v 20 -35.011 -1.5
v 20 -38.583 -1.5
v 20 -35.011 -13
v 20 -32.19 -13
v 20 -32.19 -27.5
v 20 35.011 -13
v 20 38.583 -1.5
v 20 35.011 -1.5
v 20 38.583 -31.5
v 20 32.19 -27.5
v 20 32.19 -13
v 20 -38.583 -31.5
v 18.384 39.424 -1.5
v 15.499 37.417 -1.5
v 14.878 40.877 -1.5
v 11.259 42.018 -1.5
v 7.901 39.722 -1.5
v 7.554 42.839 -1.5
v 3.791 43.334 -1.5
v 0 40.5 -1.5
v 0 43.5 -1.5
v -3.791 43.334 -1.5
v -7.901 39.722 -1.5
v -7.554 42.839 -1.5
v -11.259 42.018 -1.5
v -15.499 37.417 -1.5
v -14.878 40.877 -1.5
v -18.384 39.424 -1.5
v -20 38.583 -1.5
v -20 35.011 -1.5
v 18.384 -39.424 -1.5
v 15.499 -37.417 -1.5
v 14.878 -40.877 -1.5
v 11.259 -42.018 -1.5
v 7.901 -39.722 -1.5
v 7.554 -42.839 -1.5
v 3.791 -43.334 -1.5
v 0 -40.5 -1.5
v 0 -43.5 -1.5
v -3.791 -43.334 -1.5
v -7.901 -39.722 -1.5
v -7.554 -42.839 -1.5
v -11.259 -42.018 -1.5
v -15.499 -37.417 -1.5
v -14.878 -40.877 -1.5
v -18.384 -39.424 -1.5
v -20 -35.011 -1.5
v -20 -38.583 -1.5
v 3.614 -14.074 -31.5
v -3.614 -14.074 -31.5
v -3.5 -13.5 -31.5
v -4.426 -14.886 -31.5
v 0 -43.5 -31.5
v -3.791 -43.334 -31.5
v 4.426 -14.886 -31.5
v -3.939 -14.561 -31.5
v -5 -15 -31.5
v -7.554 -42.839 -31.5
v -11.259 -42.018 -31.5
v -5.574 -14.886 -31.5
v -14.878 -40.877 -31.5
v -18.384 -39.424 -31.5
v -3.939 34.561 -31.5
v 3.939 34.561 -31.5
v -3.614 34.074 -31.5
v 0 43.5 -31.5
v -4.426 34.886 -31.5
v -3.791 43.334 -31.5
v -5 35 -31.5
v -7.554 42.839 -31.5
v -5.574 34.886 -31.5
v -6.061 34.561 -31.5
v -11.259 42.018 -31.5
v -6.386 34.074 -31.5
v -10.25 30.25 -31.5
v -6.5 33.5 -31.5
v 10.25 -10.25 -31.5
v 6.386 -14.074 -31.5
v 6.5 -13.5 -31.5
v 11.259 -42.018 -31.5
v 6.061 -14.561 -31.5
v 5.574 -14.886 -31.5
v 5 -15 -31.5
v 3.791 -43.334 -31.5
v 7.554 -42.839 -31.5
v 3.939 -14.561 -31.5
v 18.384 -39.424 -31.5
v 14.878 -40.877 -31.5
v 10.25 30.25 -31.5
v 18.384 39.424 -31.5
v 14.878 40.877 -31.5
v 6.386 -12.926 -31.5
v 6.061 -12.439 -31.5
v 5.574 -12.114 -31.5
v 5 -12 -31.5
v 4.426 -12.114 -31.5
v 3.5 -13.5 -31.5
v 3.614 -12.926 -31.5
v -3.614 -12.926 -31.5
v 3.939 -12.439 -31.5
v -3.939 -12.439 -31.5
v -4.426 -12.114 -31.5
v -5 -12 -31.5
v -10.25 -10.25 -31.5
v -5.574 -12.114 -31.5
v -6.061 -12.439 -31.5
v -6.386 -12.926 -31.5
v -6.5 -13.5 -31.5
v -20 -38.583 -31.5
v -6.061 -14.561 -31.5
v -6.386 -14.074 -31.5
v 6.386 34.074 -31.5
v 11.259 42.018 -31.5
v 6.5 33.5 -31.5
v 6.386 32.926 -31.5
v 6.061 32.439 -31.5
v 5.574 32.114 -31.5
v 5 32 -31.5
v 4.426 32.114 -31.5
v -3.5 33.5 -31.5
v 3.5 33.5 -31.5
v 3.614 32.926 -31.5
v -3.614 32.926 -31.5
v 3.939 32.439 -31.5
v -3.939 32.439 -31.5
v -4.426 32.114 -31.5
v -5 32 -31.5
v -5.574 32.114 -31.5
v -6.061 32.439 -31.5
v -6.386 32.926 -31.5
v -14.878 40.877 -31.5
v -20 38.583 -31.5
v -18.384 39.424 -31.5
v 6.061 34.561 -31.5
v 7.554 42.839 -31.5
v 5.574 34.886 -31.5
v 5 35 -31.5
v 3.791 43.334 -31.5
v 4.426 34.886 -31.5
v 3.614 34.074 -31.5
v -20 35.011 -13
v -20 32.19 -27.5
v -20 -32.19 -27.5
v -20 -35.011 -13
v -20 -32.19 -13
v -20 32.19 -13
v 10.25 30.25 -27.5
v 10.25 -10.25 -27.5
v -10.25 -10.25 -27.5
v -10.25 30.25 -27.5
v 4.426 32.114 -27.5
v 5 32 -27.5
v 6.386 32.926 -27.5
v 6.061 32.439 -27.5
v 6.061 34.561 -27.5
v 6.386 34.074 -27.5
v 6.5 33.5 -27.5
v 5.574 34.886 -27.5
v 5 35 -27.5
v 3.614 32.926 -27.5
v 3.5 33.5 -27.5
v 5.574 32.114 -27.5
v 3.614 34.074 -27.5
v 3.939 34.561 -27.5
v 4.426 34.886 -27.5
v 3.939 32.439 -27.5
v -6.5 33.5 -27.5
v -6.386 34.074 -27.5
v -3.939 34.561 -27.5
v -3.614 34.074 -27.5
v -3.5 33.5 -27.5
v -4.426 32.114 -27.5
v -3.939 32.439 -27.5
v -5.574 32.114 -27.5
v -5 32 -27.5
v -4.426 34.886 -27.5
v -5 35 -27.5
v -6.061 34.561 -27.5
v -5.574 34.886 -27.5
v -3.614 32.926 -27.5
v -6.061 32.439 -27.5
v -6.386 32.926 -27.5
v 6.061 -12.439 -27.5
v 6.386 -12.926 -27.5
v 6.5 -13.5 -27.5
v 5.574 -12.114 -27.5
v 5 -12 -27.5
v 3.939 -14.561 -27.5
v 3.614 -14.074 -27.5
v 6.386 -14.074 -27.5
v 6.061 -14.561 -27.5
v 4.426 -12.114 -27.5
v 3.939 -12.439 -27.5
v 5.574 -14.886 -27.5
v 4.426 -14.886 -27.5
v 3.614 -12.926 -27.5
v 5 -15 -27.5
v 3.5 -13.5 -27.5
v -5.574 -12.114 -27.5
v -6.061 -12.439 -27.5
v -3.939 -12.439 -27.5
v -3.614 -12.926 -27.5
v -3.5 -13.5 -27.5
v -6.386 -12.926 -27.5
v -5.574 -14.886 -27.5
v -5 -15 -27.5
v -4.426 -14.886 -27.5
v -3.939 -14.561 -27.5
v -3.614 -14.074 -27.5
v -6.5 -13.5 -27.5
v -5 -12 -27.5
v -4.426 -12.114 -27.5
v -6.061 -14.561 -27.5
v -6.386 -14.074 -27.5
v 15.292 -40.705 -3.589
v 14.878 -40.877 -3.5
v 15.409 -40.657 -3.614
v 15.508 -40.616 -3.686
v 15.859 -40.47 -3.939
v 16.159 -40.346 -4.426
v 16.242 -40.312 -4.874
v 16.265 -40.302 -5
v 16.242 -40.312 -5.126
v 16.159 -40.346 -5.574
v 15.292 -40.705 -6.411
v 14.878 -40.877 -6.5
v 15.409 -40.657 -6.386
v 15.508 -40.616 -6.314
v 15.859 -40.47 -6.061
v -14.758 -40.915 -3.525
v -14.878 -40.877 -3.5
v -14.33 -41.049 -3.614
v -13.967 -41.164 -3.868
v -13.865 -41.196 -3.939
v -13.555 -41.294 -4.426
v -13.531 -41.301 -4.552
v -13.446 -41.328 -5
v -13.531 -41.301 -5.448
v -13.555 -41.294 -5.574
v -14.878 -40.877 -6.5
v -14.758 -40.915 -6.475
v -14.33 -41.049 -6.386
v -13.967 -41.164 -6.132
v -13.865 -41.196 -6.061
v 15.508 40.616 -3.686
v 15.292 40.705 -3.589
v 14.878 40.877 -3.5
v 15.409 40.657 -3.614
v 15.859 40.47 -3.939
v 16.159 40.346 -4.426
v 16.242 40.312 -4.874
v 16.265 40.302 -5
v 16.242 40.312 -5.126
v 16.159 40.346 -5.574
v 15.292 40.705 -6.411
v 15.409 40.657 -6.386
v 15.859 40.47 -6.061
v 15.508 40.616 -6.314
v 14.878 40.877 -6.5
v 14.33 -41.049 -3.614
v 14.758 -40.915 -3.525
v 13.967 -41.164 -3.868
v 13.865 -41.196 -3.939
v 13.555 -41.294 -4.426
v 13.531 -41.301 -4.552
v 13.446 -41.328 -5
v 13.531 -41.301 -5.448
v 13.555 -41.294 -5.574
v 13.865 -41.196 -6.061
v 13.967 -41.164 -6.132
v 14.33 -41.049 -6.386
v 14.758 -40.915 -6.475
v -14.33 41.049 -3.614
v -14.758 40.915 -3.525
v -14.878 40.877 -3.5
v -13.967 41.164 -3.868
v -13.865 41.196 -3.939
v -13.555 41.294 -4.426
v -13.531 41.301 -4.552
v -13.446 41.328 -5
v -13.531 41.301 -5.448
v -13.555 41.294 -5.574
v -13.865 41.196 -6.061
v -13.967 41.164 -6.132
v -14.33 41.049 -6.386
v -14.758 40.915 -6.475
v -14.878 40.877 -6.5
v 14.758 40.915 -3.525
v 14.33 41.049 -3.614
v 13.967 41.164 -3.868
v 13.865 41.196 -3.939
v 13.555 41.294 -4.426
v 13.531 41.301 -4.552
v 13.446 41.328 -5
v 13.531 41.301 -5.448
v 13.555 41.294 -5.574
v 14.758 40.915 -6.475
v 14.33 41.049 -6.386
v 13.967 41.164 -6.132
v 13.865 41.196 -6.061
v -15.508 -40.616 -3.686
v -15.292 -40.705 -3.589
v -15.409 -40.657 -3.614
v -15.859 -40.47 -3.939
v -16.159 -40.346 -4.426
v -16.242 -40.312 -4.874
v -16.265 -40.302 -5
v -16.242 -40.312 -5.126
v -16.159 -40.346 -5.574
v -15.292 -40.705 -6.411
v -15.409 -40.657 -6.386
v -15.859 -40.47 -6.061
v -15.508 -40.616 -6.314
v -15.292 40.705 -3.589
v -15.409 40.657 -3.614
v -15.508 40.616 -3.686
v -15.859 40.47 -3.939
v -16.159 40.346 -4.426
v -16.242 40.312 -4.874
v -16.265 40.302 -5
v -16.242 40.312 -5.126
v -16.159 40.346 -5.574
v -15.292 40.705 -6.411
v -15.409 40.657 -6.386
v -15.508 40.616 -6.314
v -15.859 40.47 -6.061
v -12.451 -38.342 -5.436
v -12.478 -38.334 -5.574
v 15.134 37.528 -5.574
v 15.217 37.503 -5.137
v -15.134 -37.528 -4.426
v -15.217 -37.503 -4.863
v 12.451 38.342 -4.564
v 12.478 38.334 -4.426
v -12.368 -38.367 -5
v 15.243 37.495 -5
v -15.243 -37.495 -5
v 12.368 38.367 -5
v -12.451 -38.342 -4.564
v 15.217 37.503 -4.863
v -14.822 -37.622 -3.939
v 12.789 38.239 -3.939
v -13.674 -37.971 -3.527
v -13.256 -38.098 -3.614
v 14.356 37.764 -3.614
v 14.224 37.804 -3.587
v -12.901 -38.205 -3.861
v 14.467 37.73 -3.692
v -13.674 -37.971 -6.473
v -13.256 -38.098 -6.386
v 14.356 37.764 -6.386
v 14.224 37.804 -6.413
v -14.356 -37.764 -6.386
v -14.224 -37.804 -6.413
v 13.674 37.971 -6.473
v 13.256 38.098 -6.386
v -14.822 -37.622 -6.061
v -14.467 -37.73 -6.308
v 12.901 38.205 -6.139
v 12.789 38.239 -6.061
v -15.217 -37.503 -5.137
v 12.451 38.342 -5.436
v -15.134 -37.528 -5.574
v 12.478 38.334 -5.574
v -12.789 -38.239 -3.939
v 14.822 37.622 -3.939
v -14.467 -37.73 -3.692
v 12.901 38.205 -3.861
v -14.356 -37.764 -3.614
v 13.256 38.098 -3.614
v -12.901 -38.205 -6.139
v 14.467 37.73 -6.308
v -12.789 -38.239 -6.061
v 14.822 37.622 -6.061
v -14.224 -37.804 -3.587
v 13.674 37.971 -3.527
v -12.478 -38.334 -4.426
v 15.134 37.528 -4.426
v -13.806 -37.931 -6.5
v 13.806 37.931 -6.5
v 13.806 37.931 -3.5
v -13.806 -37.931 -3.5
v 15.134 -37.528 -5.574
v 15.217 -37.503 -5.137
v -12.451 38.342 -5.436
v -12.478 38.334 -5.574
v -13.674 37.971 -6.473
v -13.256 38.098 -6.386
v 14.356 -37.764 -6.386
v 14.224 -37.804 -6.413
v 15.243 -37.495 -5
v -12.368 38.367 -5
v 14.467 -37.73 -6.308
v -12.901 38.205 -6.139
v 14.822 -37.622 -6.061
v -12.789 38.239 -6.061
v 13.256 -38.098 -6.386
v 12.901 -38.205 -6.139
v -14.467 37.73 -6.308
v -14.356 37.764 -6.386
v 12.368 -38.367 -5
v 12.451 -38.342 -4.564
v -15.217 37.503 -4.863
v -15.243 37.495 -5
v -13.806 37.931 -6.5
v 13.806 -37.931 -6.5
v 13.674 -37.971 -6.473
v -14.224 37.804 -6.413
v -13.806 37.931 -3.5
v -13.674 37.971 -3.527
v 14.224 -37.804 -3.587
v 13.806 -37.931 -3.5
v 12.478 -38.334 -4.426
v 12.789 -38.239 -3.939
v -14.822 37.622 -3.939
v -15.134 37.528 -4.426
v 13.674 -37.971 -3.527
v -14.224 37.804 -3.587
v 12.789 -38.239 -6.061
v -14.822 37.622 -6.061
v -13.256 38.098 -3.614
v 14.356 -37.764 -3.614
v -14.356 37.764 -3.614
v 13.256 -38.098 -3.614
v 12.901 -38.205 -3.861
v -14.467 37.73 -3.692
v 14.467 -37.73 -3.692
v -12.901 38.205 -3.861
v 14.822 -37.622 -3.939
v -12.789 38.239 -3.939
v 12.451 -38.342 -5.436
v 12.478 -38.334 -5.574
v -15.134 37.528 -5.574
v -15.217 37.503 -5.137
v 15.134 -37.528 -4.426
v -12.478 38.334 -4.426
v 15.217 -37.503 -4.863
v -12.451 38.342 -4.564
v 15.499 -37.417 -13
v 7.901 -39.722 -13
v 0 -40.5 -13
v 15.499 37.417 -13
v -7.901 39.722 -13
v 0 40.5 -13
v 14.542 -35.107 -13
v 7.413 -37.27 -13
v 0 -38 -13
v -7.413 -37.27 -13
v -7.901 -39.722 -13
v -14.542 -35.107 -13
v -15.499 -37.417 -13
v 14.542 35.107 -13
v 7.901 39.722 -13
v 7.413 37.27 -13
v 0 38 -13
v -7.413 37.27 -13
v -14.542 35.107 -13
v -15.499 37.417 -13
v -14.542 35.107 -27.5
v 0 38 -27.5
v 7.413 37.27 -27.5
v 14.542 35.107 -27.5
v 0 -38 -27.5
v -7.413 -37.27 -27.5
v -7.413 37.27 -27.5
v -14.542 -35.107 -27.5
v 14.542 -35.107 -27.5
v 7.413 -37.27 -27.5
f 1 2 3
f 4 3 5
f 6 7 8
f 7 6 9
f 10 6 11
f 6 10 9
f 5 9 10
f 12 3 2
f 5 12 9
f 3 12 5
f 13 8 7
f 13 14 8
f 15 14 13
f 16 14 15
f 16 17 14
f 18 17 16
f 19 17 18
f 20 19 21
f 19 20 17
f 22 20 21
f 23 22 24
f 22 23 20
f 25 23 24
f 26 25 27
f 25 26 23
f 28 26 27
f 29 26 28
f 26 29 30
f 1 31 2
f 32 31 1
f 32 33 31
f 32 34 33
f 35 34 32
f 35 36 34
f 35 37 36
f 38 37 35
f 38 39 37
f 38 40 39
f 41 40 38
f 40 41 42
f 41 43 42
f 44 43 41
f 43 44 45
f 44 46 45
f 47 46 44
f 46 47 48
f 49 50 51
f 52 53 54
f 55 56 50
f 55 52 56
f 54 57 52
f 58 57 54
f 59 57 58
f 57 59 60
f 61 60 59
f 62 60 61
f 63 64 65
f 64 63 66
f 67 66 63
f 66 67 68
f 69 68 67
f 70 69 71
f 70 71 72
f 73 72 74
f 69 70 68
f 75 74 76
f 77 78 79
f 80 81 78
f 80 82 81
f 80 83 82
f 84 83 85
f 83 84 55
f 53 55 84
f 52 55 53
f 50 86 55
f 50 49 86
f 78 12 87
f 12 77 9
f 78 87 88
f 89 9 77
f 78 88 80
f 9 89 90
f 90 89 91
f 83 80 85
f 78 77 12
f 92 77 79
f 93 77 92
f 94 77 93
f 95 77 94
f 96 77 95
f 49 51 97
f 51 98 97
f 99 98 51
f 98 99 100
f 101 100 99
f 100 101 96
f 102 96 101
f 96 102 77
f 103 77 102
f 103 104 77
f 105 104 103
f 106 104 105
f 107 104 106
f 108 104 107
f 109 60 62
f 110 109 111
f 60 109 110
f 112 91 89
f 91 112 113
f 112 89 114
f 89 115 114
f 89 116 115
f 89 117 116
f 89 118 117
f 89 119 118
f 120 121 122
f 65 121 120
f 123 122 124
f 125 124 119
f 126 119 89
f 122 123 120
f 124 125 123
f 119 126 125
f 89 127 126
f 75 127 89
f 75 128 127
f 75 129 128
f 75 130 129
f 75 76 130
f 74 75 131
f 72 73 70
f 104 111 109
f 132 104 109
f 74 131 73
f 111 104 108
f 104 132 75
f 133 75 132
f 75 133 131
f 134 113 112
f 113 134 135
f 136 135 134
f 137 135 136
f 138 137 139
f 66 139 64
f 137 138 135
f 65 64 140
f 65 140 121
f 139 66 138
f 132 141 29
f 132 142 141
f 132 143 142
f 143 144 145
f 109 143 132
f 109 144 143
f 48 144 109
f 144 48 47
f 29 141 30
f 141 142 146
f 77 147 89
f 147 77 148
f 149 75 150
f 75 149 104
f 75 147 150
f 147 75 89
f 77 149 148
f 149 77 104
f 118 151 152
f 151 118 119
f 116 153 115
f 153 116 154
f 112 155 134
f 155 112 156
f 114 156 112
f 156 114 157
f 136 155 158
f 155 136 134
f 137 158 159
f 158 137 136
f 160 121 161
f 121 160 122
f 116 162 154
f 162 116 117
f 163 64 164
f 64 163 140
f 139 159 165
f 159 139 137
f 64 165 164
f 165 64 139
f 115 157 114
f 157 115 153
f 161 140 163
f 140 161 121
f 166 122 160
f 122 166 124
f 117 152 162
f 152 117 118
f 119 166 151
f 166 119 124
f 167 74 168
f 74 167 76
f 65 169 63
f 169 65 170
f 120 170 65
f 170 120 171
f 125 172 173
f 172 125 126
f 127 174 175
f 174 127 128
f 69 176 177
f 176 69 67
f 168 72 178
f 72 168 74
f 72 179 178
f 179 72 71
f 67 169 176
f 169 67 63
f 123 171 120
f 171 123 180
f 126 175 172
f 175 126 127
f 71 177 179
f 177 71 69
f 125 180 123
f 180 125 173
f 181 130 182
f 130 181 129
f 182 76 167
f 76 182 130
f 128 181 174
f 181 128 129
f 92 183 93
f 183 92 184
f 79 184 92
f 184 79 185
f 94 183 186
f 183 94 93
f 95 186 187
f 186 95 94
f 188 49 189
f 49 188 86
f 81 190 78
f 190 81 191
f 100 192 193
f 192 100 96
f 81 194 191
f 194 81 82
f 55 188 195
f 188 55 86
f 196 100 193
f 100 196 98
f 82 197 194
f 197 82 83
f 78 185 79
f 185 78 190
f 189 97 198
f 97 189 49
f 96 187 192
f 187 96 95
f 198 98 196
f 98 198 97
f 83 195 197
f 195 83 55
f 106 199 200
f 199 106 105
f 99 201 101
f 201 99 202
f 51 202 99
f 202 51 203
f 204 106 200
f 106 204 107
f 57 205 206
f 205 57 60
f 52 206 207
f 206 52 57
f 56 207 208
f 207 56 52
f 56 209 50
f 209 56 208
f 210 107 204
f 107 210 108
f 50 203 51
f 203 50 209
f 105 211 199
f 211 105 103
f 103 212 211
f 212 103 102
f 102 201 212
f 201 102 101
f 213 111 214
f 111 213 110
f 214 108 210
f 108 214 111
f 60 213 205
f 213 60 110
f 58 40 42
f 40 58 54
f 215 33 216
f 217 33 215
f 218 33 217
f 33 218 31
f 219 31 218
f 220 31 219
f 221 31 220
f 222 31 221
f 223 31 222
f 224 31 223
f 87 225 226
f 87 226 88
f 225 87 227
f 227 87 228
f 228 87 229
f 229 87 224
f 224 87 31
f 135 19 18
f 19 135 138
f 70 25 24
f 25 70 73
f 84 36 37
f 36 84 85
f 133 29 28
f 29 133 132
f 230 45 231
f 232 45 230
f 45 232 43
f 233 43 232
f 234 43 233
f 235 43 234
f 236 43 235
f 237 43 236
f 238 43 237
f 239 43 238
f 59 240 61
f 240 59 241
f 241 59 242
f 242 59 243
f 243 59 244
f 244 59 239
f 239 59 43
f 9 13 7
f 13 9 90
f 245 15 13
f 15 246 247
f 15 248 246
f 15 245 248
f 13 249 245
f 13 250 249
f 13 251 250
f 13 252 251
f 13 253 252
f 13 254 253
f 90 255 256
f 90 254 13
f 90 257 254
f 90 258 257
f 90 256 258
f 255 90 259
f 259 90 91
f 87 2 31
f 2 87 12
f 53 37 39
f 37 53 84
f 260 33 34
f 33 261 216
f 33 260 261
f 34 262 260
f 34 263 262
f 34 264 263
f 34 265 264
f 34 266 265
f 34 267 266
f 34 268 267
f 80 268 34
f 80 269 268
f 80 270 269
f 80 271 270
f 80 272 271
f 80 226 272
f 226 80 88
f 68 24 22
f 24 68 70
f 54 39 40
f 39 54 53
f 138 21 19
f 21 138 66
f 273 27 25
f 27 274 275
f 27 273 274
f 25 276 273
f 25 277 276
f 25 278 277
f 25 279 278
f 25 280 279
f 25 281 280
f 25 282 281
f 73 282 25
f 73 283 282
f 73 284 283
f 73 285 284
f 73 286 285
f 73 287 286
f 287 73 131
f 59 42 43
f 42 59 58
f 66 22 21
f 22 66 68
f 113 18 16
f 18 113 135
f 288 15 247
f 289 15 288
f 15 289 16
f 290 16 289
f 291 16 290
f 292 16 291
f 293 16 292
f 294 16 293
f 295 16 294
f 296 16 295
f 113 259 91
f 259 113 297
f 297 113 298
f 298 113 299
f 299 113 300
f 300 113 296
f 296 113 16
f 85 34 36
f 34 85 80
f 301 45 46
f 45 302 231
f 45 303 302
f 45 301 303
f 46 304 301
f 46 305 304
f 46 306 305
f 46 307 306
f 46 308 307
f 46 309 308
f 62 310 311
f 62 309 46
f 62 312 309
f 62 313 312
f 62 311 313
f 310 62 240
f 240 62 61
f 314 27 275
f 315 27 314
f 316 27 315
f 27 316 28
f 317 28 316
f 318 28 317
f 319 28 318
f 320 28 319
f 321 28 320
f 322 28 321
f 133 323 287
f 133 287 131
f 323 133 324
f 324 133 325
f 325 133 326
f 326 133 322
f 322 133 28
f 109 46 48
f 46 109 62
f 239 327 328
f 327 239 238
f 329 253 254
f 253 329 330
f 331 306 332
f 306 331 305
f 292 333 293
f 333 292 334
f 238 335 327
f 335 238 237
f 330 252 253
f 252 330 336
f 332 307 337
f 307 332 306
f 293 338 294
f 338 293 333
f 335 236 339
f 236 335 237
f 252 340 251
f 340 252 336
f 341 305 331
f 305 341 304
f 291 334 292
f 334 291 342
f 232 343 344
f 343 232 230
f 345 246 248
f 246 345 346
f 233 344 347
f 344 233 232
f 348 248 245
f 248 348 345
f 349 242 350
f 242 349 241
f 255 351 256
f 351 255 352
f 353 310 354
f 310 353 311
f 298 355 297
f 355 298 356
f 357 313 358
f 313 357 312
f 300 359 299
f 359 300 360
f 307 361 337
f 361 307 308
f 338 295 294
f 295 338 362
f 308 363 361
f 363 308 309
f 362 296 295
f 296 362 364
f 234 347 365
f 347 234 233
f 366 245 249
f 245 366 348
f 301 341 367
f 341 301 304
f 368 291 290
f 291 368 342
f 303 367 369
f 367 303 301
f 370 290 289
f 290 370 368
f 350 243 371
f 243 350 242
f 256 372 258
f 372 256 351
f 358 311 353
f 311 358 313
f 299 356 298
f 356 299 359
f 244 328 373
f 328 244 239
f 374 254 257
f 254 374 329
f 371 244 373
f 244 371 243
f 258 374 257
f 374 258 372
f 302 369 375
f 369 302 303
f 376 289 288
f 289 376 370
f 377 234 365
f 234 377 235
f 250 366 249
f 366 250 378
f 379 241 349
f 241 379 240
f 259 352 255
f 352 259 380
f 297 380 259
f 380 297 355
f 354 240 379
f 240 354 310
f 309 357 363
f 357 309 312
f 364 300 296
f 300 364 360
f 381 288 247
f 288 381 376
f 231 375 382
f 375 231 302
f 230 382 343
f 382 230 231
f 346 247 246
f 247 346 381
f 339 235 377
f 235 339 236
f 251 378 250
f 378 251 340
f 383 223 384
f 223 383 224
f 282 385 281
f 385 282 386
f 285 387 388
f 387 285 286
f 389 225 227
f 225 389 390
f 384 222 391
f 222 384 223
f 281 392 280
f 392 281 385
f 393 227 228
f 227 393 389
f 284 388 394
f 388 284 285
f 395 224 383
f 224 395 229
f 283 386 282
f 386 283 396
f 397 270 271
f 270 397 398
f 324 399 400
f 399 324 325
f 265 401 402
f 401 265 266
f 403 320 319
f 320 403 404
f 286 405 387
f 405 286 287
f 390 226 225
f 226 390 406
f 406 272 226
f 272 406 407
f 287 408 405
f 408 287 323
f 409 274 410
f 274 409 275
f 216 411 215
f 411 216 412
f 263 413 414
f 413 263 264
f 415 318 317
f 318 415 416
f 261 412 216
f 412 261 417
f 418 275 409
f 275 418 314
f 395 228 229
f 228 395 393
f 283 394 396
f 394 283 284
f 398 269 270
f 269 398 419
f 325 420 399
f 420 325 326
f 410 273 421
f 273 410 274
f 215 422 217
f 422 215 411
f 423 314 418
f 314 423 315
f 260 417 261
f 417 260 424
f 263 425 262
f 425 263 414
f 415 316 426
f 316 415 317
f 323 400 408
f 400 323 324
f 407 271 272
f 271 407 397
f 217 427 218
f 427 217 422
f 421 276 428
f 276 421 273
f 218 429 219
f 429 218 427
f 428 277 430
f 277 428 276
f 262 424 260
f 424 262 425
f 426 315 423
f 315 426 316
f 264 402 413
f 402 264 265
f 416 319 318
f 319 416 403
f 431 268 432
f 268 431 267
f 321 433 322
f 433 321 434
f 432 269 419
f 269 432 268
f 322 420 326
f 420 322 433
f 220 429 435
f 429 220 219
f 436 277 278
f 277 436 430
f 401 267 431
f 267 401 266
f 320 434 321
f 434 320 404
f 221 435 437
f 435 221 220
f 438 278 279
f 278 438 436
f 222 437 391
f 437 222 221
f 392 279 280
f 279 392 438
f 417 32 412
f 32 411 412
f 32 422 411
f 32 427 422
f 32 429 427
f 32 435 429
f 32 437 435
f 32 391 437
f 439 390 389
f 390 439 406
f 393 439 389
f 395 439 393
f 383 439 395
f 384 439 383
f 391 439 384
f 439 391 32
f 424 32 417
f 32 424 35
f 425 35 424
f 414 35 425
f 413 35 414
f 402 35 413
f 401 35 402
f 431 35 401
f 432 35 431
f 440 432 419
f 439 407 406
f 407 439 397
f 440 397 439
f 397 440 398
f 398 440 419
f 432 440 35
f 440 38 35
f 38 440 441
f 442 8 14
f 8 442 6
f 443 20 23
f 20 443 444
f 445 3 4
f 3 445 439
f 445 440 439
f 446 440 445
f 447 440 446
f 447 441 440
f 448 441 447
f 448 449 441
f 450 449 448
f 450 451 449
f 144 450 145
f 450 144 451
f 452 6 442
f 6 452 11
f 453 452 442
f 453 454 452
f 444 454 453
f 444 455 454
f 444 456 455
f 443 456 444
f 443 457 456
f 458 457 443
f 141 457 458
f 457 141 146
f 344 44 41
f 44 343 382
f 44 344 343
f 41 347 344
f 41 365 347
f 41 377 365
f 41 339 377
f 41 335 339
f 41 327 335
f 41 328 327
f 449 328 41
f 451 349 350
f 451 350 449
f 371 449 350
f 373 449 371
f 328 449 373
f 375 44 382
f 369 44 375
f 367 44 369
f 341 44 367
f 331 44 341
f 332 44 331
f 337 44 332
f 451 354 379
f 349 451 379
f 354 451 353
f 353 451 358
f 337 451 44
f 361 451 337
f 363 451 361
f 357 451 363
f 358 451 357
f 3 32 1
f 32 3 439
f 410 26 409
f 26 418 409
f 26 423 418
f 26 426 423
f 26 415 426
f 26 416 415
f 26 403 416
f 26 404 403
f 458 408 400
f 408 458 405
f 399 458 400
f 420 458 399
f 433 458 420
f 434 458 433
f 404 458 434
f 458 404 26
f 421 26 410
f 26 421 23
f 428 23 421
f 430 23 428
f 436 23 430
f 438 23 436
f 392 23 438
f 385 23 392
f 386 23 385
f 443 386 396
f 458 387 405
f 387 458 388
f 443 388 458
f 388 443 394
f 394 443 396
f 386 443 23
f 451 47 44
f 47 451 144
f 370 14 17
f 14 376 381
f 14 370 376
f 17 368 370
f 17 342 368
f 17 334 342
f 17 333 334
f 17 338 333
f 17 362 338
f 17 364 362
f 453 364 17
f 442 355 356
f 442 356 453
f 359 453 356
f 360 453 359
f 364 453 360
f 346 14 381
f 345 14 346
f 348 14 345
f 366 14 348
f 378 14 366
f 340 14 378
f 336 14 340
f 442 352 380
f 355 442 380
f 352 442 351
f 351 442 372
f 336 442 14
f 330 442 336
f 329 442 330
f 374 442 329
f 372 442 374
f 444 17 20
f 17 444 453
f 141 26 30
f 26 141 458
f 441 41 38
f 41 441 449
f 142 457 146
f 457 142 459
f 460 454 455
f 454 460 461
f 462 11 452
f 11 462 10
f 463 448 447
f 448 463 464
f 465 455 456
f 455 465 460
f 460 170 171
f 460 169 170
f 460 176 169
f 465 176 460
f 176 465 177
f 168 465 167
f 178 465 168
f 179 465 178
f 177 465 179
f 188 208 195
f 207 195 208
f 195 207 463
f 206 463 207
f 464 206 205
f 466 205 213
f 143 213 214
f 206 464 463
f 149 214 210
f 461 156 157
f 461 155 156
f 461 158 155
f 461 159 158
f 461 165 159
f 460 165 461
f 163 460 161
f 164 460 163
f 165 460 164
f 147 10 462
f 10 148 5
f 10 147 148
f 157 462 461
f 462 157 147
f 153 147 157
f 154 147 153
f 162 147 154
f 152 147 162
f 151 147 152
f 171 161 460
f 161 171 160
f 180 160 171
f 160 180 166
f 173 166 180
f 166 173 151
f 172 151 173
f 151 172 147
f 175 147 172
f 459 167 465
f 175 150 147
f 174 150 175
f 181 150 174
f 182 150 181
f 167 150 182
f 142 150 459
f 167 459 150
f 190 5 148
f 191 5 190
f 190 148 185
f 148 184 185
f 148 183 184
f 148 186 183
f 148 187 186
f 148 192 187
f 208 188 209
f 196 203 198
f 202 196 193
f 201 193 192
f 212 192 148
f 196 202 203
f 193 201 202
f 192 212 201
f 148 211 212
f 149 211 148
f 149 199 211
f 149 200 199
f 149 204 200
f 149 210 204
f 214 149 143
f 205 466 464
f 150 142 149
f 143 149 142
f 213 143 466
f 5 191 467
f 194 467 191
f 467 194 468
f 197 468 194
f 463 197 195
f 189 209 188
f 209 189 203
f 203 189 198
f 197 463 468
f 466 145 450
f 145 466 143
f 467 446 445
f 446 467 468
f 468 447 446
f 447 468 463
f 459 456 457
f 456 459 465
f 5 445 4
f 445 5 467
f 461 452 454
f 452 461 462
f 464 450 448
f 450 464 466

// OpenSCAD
render_mount=true;
render_axel=false;

// servo mount
if(render_mount) {
    difference() {
        translate([0,10,-19]) {
            difference() {
                difference() {
                    // base
                    translate([0,0,2.5]) cube([40,115,30],center=true);
                    // servo hole
                    cube([20.5,40.5,40.5],center=true);
                }
                
                // servo mountig bolt holes
                for(multiplier=[[1,1],[-1,1],[1,-1],[-1,-1]]) {
                    translate([multiplier[0]*5,multiplier[1]*23.5]) {
                        cylinder(h=55,r1=1.5,r2=1.5,$fn= 16,center=true);
                    }
                }
            }
        }

        // inner cuttings
        translate([0,0,12]) difference() {
            cylinder(h=50,r1=40.5,r2=40.5,$fn=32,center=true);
        }
        cylinder(h=55,r1=38,r2=38,$fn=32,center=true);

        // outer cuttings
        difference() {
            cylinder(h=70,r1=80.5,r2=80.5,$fn=16,center=true);
            cylinder(h=70,r1=43.5,r2=43.5,$fn=72,center=true);
        }
        
        // base mounting holes
        for(multiplier=[-1,1]) {
               translate([0,0,-5]) rotate([-90,0,multiplier*20]) {
                    cylinder(h=155,r1=1.5,r2=1.5,$fn= 16,center=true);
                }
        }
    }
}

// axel
if(render_axel) {
    difference() {
        // axel
        union() {
            cylinder(h=77,r1=7,r2=7,$fn=32);
            translate([0,0,-10]) cylinder(h=10,r1=10,r2=10,$fn=32);
        }
        
        rotate([0,0,90]) translate([0,0,-10]) union() {
            // servo axel tightening
            translate([-1,0,0]) cube([2,20,15]);
            translate([-10,5,5]) rotate([90,0,90]) union() {
                // bolt hole
                cylinder(h=20,r1=1.55,r2=1.55,$fn=32);
                // bolt head hole
                translate([0,0,13]) cylinder(h=20,r1=3,r2=3,$fn=32);
                // nut hole
                translate([0,0,-13]) cylinder(h=20,r1=3,r2=3,$fn=8);
            }
            // servo axel hole
            cylinder(h=15,r1=3,r2=3,$fn=32);
        }
        // plate mounting
        translate([0,0,52]) {
            cube([40,1,50],center=true);
        }
        
        // plate screw holes
        for(positions=[[0,0,44],[0,0,65.5]]) {
            translate(positions) {
                rotate([-90,0,0]) {
                    cylinder(h=55,r1=1.5,r2=1.5,$fn= 16,center=true);
                }
            }
        }
   }
   // position indicator
   translate([0,-10,-10]) {
       difference() {
           translate([3,0,0]) cube([45,20,3]);
           rotate([0,0,-11]) translate([-5,19,0]) cube([60,20,4]);
           rotate([0,0,11]) translate([-5,-19,0]) cube([60,20,4]);
       }
   }
}
